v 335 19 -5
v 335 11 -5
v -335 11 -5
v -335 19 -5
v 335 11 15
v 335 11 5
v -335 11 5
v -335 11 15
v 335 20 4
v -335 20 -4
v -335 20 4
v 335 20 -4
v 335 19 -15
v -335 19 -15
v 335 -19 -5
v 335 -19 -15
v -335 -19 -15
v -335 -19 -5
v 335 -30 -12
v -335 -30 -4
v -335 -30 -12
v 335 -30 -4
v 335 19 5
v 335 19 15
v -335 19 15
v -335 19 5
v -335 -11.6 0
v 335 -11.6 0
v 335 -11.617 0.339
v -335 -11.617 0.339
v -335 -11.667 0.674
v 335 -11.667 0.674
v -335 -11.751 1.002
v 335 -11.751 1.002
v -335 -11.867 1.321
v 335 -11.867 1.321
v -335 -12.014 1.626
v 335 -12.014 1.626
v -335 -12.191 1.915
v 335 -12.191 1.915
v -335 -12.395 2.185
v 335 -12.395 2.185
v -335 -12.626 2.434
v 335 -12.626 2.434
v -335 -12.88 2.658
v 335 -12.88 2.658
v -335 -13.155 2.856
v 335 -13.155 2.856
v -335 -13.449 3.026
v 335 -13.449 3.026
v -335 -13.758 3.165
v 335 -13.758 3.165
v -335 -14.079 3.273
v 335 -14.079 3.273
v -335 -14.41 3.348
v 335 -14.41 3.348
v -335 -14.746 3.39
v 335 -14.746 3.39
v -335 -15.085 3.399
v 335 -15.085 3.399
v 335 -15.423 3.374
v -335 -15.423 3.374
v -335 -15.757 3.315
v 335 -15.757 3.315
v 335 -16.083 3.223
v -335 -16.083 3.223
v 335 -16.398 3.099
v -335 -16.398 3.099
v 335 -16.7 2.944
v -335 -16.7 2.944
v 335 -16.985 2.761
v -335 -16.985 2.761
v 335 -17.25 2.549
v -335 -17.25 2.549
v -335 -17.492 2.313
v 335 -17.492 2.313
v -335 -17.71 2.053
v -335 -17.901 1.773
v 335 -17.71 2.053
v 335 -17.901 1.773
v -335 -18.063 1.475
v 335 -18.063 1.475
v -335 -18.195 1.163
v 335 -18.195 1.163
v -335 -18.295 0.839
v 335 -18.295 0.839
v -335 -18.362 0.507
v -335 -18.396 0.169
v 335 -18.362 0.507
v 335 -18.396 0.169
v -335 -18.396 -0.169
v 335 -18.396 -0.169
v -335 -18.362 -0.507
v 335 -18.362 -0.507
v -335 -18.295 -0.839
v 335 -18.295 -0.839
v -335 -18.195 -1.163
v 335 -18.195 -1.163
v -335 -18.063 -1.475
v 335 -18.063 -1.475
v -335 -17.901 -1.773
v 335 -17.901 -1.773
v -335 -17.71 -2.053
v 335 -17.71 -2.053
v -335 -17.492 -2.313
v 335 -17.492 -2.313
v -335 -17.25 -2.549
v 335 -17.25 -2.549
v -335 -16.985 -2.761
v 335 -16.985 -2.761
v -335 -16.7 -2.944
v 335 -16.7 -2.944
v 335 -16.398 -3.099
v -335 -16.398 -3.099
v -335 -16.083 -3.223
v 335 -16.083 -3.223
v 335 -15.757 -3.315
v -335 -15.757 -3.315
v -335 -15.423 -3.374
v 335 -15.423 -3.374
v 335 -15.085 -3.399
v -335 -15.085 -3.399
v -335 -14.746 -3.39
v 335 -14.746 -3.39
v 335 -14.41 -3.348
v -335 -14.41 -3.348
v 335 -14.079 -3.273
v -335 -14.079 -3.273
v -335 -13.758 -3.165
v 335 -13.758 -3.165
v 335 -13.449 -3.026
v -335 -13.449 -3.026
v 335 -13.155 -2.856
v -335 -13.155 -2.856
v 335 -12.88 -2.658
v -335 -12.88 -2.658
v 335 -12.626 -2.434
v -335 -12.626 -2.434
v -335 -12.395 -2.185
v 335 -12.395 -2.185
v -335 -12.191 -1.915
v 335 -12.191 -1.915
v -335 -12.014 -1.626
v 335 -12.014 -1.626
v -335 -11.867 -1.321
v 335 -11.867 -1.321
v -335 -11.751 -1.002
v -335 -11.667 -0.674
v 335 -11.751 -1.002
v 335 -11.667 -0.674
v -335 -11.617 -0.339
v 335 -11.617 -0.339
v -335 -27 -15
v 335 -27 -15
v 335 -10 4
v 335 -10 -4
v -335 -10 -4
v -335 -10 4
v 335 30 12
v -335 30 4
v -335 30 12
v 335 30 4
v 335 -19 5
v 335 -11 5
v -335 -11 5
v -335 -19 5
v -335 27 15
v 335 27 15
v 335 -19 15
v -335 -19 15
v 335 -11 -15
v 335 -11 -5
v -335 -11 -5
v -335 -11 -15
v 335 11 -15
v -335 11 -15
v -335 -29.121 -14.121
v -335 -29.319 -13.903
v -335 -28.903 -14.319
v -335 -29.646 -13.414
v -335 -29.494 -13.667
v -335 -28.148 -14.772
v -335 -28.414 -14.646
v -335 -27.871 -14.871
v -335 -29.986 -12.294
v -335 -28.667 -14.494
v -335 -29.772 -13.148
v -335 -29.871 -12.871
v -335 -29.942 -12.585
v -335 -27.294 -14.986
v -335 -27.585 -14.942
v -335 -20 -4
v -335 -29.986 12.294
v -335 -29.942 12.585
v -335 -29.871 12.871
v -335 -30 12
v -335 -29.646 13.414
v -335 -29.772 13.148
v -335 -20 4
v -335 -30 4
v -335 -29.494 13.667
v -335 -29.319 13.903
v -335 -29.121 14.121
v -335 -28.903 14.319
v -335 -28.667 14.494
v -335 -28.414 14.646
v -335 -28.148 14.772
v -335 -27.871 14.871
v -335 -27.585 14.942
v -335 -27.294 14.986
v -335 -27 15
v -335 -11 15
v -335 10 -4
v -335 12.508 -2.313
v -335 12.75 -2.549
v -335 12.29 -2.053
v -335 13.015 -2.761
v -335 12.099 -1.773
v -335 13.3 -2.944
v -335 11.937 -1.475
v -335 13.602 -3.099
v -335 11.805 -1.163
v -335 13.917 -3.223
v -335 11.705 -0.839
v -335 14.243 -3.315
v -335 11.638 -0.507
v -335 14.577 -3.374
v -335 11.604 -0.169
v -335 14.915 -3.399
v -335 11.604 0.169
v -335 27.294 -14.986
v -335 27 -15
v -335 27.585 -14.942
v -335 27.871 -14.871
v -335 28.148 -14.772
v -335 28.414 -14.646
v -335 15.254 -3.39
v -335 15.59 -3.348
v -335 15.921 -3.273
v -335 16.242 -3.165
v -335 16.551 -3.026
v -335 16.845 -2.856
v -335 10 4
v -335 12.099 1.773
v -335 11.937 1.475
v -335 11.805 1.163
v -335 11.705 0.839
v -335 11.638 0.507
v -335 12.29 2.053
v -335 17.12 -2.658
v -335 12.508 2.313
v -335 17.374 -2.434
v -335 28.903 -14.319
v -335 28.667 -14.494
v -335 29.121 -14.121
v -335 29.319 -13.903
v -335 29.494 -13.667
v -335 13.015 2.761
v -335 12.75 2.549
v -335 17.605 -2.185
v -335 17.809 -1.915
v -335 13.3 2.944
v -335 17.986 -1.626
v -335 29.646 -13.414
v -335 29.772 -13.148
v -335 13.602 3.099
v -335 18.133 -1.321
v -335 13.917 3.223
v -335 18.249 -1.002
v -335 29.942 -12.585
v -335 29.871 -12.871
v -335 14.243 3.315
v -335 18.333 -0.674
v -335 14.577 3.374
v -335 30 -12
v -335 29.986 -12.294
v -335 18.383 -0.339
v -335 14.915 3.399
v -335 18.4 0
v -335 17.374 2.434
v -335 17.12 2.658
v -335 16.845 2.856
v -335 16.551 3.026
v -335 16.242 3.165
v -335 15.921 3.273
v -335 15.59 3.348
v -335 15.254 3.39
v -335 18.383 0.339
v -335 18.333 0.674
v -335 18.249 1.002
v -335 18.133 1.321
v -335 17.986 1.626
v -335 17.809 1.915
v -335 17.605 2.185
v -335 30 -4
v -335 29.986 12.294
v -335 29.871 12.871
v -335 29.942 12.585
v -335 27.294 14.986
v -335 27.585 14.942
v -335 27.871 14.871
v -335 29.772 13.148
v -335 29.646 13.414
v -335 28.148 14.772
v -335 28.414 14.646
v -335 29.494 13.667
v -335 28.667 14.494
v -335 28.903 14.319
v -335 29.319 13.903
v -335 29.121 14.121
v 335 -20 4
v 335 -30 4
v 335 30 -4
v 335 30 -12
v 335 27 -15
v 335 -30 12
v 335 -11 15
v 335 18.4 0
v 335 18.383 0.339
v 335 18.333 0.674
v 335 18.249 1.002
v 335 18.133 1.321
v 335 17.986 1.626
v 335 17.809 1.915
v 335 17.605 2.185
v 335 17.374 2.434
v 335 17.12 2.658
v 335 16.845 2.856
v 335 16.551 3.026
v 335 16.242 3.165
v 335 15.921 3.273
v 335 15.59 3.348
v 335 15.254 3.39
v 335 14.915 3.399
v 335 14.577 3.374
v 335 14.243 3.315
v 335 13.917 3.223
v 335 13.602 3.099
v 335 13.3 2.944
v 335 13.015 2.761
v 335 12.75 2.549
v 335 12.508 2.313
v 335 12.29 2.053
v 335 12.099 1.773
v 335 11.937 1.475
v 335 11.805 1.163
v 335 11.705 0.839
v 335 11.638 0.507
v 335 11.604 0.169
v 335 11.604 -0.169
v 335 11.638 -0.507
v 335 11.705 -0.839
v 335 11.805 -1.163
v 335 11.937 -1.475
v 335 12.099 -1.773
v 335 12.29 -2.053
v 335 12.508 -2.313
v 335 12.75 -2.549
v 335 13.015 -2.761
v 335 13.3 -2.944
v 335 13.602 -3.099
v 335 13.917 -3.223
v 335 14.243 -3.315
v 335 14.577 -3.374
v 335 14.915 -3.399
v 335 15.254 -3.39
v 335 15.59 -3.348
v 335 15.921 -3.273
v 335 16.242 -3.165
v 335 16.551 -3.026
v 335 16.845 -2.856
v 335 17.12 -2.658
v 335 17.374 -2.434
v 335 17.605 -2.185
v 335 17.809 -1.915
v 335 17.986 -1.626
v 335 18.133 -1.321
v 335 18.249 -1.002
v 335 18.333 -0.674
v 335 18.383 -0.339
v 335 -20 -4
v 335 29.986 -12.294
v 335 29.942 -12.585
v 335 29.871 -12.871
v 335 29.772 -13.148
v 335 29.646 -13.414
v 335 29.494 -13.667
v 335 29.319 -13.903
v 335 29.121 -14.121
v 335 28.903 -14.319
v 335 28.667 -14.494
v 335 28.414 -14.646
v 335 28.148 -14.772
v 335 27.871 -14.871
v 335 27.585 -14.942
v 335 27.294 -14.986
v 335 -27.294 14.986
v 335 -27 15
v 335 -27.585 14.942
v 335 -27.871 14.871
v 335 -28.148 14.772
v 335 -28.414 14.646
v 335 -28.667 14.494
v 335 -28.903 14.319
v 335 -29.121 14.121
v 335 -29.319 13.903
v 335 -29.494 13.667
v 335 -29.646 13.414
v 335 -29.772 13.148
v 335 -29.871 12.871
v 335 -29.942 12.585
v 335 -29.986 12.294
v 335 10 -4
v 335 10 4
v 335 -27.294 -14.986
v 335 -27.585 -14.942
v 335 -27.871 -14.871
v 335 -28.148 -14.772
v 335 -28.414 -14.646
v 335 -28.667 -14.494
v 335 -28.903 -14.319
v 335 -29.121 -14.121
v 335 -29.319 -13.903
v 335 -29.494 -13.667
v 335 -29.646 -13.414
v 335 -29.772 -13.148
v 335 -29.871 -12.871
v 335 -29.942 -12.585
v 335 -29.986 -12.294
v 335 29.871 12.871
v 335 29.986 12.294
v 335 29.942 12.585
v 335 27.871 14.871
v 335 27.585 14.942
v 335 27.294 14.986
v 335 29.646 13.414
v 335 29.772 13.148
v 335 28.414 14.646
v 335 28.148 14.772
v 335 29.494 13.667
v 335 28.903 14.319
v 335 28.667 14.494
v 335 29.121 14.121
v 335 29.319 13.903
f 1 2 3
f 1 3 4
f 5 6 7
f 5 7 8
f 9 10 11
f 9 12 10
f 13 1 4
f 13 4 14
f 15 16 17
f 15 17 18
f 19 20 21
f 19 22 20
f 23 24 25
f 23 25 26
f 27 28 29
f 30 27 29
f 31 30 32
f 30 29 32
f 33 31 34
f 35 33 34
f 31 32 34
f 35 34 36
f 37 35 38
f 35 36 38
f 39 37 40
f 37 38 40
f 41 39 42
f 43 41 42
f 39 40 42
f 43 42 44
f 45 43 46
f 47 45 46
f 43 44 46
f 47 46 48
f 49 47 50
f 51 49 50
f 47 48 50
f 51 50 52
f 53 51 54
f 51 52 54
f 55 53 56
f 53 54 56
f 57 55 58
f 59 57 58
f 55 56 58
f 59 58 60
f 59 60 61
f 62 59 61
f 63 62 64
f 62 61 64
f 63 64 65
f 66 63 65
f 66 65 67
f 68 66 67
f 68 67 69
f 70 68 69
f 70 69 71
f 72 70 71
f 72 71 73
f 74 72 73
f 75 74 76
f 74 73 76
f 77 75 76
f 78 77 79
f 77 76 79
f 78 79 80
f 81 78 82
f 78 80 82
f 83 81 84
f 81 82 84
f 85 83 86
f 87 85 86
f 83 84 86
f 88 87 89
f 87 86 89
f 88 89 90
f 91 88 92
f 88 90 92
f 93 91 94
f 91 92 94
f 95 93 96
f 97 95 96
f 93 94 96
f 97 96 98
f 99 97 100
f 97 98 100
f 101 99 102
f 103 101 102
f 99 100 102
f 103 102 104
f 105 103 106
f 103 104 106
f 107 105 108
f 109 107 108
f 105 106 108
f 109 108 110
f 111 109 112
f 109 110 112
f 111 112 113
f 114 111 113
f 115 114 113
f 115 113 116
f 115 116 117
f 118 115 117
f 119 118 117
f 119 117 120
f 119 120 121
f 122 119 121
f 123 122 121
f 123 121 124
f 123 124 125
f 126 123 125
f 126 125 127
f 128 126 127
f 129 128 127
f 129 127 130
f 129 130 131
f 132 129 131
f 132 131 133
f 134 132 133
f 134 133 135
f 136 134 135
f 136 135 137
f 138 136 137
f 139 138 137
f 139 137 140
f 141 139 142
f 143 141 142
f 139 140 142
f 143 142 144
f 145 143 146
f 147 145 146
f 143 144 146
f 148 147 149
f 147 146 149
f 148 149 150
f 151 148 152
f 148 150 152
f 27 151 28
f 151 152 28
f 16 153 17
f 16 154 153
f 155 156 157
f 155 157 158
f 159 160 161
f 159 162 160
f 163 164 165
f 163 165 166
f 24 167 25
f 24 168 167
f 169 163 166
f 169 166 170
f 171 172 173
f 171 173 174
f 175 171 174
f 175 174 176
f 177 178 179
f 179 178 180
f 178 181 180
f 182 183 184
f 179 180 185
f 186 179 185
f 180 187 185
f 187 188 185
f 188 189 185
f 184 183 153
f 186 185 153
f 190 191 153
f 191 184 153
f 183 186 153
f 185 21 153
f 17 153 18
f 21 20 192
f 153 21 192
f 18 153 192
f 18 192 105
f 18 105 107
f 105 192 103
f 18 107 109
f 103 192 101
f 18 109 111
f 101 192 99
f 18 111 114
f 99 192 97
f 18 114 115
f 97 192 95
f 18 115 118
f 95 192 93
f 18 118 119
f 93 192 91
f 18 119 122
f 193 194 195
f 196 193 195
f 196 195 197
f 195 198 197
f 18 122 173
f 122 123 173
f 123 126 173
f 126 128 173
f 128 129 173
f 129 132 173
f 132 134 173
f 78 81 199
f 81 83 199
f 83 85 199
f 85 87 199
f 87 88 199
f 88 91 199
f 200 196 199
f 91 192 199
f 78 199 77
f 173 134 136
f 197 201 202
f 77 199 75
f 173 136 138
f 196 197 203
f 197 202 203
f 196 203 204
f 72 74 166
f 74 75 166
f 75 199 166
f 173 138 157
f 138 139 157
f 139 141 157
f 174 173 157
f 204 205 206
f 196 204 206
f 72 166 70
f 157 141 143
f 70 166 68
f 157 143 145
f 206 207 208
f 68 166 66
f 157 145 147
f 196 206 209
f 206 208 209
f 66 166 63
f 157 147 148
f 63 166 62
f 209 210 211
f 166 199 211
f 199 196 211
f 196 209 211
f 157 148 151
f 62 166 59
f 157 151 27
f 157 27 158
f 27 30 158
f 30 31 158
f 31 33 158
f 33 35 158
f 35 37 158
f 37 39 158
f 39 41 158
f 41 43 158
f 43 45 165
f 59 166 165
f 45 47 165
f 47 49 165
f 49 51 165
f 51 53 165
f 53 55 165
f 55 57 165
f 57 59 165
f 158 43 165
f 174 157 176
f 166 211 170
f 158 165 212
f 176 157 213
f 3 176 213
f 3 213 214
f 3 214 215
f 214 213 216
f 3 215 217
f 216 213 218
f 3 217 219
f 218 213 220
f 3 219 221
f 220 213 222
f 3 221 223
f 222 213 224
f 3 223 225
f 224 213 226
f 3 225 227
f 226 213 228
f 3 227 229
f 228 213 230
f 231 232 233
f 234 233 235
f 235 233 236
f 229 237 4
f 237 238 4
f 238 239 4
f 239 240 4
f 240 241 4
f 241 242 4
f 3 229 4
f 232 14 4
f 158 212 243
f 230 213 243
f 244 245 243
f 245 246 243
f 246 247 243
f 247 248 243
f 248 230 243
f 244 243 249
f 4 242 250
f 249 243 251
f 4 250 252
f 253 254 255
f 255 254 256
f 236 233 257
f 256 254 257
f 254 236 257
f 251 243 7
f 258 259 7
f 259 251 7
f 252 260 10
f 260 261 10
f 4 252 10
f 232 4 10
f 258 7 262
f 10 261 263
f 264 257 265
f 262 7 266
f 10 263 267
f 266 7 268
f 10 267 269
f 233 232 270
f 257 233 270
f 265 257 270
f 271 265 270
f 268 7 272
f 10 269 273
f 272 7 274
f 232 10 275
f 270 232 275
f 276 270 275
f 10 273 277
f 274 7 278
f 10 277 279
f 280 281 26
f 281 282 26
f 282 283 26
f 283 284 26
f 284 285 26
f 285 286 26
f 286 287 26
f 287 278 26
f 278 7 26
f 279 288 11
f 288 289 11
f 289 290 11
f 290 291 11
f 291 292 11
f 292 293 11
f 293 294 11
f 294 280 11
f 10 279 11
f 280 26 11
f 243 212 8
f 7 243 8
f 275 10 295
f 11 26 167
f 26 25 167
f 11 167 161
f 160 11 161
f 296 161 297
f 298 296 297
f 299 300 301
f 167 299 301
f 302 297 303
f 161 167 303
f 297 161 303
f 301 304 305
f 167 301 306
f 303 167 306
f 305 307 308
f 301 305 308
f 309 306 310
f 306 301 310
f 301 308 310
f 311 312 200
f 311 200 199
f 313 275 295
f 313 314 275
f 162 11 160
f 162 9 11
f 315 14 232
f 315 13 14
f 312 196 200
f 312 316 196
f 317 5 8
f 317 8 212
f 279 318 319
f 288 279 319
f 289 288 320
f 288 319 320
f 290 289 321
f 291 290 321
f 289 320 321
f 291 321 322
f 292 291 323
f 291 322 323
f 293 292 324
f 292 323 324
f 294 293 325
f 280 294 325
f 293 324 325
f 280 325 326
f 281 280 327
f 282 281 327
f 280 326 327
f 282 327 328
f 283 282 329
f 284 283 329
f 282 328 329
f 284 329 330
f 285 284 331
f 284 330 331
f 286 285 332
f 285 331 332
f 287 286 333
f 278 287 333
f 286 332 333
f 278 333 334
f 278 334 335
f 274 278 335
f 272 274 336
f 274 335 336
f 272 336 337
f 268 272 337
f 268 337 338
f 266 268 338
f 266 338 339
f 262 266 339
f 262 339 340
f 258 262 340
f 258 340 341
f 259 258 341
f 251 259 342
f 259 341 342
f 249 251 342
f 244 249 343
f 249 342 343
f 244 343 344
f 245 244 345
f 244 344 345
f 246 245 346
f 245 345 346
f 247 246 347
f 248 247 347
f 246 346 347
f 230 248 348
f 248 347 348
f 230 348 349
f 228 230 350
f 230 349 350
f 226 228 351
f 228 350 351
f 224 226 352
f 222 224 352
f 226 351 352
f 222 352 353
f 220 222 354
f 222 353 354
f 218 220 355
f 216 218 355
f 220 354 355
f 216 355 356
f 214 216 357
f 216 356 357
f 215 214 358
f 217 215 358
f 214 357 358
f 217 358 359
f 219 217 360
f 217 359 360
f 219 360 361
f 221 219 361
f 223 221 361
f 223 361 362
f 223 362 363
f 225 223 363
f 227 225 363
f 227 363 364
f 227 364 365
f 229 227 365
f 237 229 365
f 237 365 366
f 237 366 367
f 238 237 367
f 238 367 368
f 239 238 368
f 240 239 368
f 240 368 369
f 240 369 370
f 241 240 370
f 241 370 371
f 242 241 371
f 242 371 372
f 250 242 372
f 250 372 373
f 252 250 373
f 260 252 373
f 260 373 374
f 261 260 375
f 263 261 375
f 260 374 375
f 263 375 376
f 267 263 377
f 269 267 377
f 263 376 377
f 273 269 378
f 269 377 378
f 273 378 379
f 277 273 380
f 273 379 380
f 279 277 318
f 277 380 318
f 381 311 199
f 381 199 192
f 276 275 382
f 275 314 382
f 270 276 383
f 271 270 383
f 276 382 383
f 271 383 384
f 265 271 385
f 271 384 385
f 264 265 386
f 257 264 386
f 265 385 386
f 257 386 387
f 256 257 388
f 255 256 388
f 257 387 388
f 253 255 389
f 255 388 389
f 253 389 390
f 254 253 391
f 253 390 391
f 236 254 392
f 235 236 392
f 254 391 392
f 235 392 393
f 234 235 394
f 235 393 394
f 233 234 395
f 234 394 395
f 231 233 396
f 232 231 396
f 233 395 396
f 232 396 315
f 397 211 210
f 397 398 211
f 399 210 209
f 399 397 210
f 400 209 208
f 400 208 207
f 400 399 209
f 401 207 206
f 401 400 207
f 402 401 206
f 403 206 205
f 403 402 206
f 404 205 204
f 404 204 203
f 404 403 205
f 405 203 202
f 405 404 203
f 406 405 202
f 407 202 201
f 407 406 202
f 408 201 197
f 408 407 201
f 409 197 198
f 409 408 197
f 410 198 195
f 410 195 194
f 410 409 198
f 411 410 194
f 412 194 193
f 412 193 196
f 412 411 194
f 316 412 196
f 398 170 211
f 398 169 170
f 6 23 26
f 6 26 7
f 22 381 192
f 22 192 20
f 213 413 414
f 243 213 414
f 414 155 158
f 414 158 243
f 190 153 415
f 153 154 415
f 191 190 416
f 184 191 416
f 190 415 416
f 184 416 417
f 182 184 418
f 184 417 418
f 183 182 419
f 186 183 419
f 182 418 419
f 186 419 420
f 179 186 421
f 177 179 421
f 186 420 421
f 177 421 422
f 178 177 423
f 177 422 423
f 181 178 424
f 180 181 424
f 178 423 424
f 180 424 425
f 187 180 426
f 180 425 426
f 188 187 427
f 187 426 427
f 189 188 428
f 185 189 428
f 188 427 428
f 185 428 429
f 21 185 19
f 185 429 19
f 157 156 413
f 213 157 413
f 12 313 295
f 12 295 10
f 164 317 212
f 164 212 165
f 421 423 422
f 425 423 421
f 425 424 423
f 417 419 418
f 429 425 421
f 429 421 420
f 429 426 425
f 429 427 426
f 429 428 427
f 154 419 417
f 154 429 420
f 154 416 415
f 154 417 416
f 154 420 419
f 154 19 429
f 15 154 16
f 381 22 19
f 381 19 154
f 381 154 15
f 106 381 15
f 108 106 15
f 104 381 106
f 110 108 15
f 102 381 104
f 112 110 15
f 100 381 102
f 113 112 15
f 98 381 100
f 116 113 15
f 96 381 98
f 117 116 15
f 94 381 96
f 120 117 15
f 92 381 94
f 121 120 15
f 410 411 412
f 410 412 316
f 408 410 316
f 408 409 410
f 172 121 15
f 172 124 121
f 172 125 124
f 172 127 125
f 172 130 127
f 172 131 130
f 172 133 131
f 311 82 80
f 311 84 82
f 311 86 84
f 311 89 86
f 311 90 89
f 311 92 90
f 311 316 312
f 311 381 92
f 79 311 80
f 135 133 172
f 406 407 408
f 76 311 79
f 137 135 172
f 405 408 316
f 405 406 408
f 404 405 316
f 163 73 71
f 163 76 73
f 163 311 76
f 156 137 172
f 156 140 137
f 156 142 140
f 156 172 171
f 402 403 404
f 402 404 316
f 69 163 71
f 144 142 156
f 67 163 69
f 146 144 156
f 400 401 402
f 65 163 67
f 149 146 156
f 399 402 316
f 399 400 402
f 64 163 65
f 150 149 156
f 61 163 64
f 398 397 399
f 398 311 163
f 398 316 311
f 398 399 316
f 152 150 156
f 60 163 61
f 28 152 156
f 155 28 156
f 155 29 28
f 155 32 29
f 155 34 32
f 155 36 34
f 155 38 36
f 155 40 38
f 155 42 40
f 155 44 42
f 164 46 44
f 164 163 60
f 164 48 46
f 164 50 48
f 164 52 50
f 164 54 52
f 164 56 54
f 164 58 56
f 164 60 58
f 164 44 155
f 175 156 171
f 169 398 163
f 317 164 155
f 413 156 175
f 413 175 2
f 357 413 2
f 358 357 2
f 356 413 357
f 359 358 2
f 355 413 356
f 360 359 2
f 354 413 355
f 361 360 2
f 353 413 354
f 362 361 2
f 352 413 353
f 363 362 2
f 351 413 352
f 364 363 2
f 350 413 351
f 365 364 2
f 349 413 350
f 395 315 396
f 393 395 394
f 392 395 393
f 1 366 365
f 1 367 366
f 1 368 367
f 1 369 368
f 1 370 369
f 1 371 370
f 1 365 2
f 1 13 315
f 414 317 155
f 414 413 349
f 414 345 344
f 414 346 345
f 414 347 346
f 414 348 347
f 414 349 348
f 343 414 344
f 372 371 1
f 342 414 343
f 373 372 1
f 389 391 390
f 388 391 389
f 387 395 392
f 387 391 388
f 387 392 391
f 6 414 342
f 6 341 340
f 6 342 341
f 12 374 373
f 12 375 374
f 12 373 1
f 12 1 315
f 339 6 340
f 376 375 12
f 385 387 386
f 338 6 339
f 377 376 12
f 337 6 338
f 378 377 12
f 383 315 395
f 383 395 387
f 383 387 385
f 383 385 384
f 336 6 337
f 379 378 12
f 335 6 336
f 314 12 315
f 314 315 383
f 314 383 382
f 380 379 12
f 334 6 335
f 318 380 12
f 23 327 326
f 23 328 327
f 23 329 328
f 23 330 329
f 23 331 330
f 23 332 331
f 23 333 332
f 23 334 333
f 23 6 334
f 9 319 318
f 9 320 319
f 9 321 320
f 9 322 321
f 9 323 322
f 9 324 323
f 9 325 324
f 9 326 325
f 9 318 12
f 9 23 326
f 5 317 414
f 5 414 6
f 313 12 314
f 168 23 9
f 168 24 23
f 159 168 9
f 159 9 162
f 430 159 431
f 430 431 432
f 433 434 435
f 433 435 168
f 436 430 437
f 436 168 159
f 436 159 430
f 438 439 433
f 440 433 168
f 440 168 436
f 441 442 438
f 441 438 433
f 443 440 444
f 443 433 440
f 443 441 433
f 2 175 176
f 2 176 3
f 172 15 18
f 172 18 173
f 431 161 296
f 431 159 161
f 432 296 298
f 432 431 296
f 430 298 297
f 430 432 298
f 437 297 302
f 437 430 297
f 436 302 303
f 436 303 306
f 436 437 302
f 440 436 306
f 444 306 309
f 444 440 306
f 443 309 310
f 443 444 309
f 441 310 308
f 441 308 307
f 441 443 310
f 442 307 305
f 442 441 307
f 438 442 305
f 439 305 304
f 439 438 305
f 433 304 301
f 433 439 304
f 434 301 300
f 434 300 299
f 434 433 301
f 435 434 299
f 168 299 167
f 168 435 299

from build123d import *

# Parameters (mm, degrees)
F1_DEPTH = 335
F2_W     = 20
F2_H     = 8
F2_R     = 3.4
F3_DEPTH = 670
F4_R     = 3


with BuildPart() as f1:
    # F0 (on Right) → F1 (new body, symmetric)
    with BuildSketch(Plane.YZ):
        Polygon((30, 4), (30, 15), (19, 15), (19, 5), (11, 5), (11, 15), (-11, 15), (-11, 5), (-19, 5), (-19, 15), (-30, 15), (-30, 4), (-20, 4), (-20, -4), (-30, -4), (-30, -15), (-19, -15), (-19, -5), (-11, -5), (-11, -15), (11, -15), (11, -5), (19, -5), (19, -15), (30, -15), (30, -4), (20, -4), (20, 4), align=None)
    extrude(amount=F1_DEPTH, both=True)

    # F2 (on face) → F3 (cut)
    with BuildSketch(Plane.YZ.offset(335)):
        Rectangle(F2_W, F2_H)
        with Locations((-15, 0)):
            Circle(F2_R)
        with Locations((15, 0)):
            Circle(F2_R)
    extrude(amount=-F3_DEPTH, mode=Mode.SUBTRACT)

    # F4
    f4_edges = [f1.edges().sort_by_distance(p)[0] for p in [
        (0, -30, 15),
        (0, -30, -15),
        (0, 30, 15),
        (0, 30, -15),
    ]]
    fillet(f4_edges, radius=F4_R)


solid = f1.part
